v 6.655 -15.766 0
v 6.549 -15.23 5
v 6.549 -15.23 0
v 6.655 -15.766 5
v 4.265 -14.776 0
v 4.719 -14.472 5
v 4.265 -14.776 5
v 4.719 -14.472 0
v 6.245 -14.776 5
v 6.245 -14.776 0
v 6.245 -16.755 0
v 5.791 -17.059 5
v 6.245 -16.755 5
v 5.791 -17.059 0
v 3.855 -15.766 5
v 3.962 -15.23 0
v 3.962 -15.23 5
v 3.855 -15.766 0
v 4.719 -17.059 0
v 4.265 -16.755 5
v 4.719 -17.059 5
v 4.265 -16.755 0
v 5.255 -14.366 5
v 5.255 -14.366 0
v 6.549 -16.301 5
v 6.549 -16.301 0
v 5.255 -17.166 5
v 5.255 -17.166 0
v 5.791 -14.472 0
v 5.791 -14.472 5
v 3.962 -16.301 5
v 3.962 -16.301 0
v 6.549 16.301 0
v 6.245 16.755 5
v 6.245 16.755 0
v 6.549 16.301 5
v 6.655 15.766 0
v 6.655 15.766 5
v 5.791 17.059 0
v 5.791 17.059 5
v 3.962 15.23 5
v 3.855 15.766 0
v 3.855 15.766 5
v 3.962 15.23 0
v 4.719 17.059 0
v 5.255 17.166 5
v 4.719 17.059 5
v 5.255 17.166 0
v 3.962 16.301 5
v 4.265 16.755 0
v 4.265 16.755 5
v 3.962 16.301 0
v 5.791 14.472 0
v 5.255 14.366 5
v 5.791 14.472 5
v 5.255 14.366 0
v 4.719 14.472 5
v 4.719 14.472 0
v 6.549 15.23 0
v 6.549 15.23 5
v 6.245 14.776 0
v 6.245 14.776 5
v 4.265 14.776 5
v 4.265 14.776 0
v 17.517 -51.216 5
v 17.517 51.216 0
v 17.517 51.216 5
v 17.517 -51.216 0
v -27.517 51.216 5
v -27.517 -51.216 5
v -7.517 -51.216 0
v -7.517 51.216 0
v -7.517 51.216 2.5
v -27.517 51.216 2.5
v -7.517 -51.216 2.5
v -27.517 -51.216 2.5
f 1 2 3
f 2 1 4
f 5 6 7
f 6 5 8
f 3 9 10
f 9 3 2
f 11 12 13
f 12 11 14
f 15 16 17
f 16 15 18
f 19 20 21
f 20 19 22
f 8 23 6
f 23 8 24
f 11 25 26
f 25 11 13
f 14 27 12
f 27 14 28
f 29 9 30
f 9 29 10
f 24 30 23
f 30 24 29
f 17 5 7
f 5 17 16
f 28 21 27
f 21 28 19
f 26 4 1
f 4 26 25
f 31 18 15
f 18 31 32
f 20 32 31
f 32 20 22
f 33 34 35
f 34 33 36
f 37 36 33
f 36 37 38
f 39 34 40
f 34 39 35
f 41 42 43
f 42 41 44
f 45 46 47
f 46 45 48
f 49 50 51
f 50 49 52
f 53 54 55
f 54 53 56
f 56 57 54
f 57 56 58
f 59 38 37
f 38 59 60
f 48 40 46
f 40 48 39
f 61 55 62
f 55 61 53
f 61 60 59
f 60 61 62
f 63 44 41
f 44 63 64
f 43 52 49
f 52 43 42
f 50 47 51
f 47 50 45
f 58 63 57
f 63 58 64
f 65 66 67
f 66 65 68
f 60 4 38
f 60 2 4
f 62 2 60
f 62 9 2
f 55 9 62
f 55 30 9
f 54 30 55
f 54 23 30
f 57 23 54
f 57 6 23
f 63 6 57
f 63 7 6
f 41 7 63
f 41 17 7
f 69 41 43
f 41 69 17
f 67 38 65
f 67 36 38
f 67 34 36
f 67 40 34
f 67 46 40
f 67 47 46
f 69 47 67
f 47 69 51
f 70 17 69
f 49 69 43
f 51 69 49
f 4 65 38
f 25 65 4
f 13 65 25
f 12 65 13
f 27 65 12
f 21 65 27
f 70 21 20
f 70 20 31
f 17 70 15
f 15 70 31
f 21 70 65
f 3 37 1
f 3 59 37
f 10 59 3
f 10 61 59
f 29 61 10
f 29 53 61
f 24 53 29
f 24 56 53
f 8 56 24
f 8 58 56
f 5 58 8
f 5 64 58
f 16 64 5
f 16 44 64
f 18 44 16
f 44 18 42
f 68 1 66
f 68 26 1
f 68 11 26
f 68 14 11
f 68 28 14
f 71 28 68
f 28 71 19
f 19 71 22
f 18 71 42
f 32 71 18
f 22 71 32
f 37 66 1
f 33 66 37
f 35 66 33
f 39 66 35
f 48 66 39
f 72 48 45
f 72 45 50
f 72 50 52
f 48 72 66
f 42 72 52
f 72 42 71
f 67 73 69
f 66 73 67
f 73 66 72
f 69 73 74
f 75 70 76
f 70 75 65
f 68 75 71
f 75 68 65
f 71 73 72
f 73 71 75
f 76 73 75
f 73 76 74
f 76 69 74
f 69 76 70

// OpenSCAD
// file: ../../library/e7_all.scad
// ==========================================================================
//  e7_all.scad - include this one file. Preview, print plates and the report.
// ==========================================================================
include <e7_params.scad>
include <e7_body.scad>

// whole painted loco
module e7_preview() {
  // carbody in its paint bands
  for (i = [0:len(PAINT_BANDS) - 1]) {
    z0 = i == 0 ? -1 : p(PAINT_BANDS[i - 1][0]);
    z1 = i == len(PAINT_BANDS) - 1 ? 1000 : p(PAINT_BANDS[i][0]);
    color(PAINT_BANDS[i][1]) render(convexity = 8) e7_shell_solid([z0, z1]);
  }
  color(C_GLASS) e7_glass();
  color(C_LENS) let (d = nose_d_at_z(HEADLIGHT[0]))
    translate([XF - p(d) + p(HEADLIGHT[2]) + p(1.5), 0, p(HEADLIGHT[0])]) rotate([0, 90, 0]) cylinder(d = p(HEADLIGHT[1]) - 0.8, h = 0.5, $fn = 32);
  color(C_FRAME) { for (j = [1:NFRAME]) e7_frame_piece(j); e7_pilot(); e7_pilot_rear(); }
  for (tx = [TRK_X, -TRK_X]) translate([tx, 0, 0]) { color(C_TRUCK) e7_truck_frame(); color(C_WHEEL) e7_wheels(); }
}
// thin glass panes sitting in the window pockets (preview only)
module e7_glass() {
  intersection() { e7_loft(DET * 0.6); union() { e7_windshield_cut(); e7_side_cuts_windows_only(); } }
}
module e7_side_cuts_windows_only() {
  for (s = [-1, 1], w = CAB_WIN)
    translate([XF - p(w[1]), s * HW - (s > 0 ? DET : 3 - DET), p(w[2])]) cube([p(w[1] - w[0]), 3, p(w[3] - w[2])]);
}

// one print, laid out for the printer
module e7_plate(part) {
  sec = [for (k = [1:NSEC]) str("body_", k)];
  frm = [for (j = [1:NFRAME]) str("frame_", j)];
  if (is_num(search([part], sec)[0])) {
    k = search([part], sec)[0] + 1;
    // stand the section on its open bottom (skirt edge on the bed)
    translate([-sec_x0(k) - SEC_L / 2, 0, -Z_SKIRT]) e7_body_section(k);
  } else if (is_num(search([part], frm)[0])) {
    j = search([part], frm)[0] + 1;
    xs = concat([FRAME_X0], FRAME_SPLITS, [FRAME_X1]);
    translate([-(xs[j - 1] + xs[j]) / 2, 0, -Z_FRAME_BOT]) e7_frame_piece(j);
  } else if (part == "pilot") {
    translate([-XF, 0, 0]) rotate([0, 0, 0]) translate([0, 0, -p(5)]) e7_pilot();
  } else if (part == "pilot_rear") {
    translate([-XR, 0, 0]) translate([0, 0, -(CPL_Z - CPL_H / 2 - WALL)]) e7_pilot_rear();
  } else if (part == "truck") {
    // upside down, bolster on the bed
    translate([0, 0, Z_FRAME_BOT - 0.3]) rotate([180, 0, 0]) e7_truck_frame();
  } else {
    assert(false, str("unknown part '", part, "'"));
  }
}

module e7_report() {
  echo(str("MILW E7A ", ROAD_NO, " class ", CLASS, " - ", SC, " scale 1:", RATIO, ", paint ", PAINT));
  echo(str("  carbody ", round(BL), " mm long, ", round(2 * HW), " mm wide, roof ", round(Z_ROOF), " mm, cab ", round(Z_CAB), " mm above rail"));
  echo(str("  ", NSEC, " body sections of ", round(SEC_L), " mm; ", NFRAME, " frame pieces; trucks at +/- ", round(TRK_X), " mm"));
  echo(str("  body screws ", SCREW_BODY_NAME, " x ", 2 * len(BOSS_X), "; truck pivots ", PIVOT[1], "; wheels ", round(WHEEL_D * 10) / 10, " mm (bought)"));
}
// main file
// Milwaukee Road E7A, G scale 1-29 - print 9 of 12: frame_5 - frame plate piece 5 (front; print flat)
// Render (F6), export STL, print. Settings: ../../library/e7_params.scad
// Whole loco preview and notes: ../../MILW_E7_Main.scad
SCALE_SEL = "G";
include <../../library/e7_all.scad>
e7_plate("frame_5");
